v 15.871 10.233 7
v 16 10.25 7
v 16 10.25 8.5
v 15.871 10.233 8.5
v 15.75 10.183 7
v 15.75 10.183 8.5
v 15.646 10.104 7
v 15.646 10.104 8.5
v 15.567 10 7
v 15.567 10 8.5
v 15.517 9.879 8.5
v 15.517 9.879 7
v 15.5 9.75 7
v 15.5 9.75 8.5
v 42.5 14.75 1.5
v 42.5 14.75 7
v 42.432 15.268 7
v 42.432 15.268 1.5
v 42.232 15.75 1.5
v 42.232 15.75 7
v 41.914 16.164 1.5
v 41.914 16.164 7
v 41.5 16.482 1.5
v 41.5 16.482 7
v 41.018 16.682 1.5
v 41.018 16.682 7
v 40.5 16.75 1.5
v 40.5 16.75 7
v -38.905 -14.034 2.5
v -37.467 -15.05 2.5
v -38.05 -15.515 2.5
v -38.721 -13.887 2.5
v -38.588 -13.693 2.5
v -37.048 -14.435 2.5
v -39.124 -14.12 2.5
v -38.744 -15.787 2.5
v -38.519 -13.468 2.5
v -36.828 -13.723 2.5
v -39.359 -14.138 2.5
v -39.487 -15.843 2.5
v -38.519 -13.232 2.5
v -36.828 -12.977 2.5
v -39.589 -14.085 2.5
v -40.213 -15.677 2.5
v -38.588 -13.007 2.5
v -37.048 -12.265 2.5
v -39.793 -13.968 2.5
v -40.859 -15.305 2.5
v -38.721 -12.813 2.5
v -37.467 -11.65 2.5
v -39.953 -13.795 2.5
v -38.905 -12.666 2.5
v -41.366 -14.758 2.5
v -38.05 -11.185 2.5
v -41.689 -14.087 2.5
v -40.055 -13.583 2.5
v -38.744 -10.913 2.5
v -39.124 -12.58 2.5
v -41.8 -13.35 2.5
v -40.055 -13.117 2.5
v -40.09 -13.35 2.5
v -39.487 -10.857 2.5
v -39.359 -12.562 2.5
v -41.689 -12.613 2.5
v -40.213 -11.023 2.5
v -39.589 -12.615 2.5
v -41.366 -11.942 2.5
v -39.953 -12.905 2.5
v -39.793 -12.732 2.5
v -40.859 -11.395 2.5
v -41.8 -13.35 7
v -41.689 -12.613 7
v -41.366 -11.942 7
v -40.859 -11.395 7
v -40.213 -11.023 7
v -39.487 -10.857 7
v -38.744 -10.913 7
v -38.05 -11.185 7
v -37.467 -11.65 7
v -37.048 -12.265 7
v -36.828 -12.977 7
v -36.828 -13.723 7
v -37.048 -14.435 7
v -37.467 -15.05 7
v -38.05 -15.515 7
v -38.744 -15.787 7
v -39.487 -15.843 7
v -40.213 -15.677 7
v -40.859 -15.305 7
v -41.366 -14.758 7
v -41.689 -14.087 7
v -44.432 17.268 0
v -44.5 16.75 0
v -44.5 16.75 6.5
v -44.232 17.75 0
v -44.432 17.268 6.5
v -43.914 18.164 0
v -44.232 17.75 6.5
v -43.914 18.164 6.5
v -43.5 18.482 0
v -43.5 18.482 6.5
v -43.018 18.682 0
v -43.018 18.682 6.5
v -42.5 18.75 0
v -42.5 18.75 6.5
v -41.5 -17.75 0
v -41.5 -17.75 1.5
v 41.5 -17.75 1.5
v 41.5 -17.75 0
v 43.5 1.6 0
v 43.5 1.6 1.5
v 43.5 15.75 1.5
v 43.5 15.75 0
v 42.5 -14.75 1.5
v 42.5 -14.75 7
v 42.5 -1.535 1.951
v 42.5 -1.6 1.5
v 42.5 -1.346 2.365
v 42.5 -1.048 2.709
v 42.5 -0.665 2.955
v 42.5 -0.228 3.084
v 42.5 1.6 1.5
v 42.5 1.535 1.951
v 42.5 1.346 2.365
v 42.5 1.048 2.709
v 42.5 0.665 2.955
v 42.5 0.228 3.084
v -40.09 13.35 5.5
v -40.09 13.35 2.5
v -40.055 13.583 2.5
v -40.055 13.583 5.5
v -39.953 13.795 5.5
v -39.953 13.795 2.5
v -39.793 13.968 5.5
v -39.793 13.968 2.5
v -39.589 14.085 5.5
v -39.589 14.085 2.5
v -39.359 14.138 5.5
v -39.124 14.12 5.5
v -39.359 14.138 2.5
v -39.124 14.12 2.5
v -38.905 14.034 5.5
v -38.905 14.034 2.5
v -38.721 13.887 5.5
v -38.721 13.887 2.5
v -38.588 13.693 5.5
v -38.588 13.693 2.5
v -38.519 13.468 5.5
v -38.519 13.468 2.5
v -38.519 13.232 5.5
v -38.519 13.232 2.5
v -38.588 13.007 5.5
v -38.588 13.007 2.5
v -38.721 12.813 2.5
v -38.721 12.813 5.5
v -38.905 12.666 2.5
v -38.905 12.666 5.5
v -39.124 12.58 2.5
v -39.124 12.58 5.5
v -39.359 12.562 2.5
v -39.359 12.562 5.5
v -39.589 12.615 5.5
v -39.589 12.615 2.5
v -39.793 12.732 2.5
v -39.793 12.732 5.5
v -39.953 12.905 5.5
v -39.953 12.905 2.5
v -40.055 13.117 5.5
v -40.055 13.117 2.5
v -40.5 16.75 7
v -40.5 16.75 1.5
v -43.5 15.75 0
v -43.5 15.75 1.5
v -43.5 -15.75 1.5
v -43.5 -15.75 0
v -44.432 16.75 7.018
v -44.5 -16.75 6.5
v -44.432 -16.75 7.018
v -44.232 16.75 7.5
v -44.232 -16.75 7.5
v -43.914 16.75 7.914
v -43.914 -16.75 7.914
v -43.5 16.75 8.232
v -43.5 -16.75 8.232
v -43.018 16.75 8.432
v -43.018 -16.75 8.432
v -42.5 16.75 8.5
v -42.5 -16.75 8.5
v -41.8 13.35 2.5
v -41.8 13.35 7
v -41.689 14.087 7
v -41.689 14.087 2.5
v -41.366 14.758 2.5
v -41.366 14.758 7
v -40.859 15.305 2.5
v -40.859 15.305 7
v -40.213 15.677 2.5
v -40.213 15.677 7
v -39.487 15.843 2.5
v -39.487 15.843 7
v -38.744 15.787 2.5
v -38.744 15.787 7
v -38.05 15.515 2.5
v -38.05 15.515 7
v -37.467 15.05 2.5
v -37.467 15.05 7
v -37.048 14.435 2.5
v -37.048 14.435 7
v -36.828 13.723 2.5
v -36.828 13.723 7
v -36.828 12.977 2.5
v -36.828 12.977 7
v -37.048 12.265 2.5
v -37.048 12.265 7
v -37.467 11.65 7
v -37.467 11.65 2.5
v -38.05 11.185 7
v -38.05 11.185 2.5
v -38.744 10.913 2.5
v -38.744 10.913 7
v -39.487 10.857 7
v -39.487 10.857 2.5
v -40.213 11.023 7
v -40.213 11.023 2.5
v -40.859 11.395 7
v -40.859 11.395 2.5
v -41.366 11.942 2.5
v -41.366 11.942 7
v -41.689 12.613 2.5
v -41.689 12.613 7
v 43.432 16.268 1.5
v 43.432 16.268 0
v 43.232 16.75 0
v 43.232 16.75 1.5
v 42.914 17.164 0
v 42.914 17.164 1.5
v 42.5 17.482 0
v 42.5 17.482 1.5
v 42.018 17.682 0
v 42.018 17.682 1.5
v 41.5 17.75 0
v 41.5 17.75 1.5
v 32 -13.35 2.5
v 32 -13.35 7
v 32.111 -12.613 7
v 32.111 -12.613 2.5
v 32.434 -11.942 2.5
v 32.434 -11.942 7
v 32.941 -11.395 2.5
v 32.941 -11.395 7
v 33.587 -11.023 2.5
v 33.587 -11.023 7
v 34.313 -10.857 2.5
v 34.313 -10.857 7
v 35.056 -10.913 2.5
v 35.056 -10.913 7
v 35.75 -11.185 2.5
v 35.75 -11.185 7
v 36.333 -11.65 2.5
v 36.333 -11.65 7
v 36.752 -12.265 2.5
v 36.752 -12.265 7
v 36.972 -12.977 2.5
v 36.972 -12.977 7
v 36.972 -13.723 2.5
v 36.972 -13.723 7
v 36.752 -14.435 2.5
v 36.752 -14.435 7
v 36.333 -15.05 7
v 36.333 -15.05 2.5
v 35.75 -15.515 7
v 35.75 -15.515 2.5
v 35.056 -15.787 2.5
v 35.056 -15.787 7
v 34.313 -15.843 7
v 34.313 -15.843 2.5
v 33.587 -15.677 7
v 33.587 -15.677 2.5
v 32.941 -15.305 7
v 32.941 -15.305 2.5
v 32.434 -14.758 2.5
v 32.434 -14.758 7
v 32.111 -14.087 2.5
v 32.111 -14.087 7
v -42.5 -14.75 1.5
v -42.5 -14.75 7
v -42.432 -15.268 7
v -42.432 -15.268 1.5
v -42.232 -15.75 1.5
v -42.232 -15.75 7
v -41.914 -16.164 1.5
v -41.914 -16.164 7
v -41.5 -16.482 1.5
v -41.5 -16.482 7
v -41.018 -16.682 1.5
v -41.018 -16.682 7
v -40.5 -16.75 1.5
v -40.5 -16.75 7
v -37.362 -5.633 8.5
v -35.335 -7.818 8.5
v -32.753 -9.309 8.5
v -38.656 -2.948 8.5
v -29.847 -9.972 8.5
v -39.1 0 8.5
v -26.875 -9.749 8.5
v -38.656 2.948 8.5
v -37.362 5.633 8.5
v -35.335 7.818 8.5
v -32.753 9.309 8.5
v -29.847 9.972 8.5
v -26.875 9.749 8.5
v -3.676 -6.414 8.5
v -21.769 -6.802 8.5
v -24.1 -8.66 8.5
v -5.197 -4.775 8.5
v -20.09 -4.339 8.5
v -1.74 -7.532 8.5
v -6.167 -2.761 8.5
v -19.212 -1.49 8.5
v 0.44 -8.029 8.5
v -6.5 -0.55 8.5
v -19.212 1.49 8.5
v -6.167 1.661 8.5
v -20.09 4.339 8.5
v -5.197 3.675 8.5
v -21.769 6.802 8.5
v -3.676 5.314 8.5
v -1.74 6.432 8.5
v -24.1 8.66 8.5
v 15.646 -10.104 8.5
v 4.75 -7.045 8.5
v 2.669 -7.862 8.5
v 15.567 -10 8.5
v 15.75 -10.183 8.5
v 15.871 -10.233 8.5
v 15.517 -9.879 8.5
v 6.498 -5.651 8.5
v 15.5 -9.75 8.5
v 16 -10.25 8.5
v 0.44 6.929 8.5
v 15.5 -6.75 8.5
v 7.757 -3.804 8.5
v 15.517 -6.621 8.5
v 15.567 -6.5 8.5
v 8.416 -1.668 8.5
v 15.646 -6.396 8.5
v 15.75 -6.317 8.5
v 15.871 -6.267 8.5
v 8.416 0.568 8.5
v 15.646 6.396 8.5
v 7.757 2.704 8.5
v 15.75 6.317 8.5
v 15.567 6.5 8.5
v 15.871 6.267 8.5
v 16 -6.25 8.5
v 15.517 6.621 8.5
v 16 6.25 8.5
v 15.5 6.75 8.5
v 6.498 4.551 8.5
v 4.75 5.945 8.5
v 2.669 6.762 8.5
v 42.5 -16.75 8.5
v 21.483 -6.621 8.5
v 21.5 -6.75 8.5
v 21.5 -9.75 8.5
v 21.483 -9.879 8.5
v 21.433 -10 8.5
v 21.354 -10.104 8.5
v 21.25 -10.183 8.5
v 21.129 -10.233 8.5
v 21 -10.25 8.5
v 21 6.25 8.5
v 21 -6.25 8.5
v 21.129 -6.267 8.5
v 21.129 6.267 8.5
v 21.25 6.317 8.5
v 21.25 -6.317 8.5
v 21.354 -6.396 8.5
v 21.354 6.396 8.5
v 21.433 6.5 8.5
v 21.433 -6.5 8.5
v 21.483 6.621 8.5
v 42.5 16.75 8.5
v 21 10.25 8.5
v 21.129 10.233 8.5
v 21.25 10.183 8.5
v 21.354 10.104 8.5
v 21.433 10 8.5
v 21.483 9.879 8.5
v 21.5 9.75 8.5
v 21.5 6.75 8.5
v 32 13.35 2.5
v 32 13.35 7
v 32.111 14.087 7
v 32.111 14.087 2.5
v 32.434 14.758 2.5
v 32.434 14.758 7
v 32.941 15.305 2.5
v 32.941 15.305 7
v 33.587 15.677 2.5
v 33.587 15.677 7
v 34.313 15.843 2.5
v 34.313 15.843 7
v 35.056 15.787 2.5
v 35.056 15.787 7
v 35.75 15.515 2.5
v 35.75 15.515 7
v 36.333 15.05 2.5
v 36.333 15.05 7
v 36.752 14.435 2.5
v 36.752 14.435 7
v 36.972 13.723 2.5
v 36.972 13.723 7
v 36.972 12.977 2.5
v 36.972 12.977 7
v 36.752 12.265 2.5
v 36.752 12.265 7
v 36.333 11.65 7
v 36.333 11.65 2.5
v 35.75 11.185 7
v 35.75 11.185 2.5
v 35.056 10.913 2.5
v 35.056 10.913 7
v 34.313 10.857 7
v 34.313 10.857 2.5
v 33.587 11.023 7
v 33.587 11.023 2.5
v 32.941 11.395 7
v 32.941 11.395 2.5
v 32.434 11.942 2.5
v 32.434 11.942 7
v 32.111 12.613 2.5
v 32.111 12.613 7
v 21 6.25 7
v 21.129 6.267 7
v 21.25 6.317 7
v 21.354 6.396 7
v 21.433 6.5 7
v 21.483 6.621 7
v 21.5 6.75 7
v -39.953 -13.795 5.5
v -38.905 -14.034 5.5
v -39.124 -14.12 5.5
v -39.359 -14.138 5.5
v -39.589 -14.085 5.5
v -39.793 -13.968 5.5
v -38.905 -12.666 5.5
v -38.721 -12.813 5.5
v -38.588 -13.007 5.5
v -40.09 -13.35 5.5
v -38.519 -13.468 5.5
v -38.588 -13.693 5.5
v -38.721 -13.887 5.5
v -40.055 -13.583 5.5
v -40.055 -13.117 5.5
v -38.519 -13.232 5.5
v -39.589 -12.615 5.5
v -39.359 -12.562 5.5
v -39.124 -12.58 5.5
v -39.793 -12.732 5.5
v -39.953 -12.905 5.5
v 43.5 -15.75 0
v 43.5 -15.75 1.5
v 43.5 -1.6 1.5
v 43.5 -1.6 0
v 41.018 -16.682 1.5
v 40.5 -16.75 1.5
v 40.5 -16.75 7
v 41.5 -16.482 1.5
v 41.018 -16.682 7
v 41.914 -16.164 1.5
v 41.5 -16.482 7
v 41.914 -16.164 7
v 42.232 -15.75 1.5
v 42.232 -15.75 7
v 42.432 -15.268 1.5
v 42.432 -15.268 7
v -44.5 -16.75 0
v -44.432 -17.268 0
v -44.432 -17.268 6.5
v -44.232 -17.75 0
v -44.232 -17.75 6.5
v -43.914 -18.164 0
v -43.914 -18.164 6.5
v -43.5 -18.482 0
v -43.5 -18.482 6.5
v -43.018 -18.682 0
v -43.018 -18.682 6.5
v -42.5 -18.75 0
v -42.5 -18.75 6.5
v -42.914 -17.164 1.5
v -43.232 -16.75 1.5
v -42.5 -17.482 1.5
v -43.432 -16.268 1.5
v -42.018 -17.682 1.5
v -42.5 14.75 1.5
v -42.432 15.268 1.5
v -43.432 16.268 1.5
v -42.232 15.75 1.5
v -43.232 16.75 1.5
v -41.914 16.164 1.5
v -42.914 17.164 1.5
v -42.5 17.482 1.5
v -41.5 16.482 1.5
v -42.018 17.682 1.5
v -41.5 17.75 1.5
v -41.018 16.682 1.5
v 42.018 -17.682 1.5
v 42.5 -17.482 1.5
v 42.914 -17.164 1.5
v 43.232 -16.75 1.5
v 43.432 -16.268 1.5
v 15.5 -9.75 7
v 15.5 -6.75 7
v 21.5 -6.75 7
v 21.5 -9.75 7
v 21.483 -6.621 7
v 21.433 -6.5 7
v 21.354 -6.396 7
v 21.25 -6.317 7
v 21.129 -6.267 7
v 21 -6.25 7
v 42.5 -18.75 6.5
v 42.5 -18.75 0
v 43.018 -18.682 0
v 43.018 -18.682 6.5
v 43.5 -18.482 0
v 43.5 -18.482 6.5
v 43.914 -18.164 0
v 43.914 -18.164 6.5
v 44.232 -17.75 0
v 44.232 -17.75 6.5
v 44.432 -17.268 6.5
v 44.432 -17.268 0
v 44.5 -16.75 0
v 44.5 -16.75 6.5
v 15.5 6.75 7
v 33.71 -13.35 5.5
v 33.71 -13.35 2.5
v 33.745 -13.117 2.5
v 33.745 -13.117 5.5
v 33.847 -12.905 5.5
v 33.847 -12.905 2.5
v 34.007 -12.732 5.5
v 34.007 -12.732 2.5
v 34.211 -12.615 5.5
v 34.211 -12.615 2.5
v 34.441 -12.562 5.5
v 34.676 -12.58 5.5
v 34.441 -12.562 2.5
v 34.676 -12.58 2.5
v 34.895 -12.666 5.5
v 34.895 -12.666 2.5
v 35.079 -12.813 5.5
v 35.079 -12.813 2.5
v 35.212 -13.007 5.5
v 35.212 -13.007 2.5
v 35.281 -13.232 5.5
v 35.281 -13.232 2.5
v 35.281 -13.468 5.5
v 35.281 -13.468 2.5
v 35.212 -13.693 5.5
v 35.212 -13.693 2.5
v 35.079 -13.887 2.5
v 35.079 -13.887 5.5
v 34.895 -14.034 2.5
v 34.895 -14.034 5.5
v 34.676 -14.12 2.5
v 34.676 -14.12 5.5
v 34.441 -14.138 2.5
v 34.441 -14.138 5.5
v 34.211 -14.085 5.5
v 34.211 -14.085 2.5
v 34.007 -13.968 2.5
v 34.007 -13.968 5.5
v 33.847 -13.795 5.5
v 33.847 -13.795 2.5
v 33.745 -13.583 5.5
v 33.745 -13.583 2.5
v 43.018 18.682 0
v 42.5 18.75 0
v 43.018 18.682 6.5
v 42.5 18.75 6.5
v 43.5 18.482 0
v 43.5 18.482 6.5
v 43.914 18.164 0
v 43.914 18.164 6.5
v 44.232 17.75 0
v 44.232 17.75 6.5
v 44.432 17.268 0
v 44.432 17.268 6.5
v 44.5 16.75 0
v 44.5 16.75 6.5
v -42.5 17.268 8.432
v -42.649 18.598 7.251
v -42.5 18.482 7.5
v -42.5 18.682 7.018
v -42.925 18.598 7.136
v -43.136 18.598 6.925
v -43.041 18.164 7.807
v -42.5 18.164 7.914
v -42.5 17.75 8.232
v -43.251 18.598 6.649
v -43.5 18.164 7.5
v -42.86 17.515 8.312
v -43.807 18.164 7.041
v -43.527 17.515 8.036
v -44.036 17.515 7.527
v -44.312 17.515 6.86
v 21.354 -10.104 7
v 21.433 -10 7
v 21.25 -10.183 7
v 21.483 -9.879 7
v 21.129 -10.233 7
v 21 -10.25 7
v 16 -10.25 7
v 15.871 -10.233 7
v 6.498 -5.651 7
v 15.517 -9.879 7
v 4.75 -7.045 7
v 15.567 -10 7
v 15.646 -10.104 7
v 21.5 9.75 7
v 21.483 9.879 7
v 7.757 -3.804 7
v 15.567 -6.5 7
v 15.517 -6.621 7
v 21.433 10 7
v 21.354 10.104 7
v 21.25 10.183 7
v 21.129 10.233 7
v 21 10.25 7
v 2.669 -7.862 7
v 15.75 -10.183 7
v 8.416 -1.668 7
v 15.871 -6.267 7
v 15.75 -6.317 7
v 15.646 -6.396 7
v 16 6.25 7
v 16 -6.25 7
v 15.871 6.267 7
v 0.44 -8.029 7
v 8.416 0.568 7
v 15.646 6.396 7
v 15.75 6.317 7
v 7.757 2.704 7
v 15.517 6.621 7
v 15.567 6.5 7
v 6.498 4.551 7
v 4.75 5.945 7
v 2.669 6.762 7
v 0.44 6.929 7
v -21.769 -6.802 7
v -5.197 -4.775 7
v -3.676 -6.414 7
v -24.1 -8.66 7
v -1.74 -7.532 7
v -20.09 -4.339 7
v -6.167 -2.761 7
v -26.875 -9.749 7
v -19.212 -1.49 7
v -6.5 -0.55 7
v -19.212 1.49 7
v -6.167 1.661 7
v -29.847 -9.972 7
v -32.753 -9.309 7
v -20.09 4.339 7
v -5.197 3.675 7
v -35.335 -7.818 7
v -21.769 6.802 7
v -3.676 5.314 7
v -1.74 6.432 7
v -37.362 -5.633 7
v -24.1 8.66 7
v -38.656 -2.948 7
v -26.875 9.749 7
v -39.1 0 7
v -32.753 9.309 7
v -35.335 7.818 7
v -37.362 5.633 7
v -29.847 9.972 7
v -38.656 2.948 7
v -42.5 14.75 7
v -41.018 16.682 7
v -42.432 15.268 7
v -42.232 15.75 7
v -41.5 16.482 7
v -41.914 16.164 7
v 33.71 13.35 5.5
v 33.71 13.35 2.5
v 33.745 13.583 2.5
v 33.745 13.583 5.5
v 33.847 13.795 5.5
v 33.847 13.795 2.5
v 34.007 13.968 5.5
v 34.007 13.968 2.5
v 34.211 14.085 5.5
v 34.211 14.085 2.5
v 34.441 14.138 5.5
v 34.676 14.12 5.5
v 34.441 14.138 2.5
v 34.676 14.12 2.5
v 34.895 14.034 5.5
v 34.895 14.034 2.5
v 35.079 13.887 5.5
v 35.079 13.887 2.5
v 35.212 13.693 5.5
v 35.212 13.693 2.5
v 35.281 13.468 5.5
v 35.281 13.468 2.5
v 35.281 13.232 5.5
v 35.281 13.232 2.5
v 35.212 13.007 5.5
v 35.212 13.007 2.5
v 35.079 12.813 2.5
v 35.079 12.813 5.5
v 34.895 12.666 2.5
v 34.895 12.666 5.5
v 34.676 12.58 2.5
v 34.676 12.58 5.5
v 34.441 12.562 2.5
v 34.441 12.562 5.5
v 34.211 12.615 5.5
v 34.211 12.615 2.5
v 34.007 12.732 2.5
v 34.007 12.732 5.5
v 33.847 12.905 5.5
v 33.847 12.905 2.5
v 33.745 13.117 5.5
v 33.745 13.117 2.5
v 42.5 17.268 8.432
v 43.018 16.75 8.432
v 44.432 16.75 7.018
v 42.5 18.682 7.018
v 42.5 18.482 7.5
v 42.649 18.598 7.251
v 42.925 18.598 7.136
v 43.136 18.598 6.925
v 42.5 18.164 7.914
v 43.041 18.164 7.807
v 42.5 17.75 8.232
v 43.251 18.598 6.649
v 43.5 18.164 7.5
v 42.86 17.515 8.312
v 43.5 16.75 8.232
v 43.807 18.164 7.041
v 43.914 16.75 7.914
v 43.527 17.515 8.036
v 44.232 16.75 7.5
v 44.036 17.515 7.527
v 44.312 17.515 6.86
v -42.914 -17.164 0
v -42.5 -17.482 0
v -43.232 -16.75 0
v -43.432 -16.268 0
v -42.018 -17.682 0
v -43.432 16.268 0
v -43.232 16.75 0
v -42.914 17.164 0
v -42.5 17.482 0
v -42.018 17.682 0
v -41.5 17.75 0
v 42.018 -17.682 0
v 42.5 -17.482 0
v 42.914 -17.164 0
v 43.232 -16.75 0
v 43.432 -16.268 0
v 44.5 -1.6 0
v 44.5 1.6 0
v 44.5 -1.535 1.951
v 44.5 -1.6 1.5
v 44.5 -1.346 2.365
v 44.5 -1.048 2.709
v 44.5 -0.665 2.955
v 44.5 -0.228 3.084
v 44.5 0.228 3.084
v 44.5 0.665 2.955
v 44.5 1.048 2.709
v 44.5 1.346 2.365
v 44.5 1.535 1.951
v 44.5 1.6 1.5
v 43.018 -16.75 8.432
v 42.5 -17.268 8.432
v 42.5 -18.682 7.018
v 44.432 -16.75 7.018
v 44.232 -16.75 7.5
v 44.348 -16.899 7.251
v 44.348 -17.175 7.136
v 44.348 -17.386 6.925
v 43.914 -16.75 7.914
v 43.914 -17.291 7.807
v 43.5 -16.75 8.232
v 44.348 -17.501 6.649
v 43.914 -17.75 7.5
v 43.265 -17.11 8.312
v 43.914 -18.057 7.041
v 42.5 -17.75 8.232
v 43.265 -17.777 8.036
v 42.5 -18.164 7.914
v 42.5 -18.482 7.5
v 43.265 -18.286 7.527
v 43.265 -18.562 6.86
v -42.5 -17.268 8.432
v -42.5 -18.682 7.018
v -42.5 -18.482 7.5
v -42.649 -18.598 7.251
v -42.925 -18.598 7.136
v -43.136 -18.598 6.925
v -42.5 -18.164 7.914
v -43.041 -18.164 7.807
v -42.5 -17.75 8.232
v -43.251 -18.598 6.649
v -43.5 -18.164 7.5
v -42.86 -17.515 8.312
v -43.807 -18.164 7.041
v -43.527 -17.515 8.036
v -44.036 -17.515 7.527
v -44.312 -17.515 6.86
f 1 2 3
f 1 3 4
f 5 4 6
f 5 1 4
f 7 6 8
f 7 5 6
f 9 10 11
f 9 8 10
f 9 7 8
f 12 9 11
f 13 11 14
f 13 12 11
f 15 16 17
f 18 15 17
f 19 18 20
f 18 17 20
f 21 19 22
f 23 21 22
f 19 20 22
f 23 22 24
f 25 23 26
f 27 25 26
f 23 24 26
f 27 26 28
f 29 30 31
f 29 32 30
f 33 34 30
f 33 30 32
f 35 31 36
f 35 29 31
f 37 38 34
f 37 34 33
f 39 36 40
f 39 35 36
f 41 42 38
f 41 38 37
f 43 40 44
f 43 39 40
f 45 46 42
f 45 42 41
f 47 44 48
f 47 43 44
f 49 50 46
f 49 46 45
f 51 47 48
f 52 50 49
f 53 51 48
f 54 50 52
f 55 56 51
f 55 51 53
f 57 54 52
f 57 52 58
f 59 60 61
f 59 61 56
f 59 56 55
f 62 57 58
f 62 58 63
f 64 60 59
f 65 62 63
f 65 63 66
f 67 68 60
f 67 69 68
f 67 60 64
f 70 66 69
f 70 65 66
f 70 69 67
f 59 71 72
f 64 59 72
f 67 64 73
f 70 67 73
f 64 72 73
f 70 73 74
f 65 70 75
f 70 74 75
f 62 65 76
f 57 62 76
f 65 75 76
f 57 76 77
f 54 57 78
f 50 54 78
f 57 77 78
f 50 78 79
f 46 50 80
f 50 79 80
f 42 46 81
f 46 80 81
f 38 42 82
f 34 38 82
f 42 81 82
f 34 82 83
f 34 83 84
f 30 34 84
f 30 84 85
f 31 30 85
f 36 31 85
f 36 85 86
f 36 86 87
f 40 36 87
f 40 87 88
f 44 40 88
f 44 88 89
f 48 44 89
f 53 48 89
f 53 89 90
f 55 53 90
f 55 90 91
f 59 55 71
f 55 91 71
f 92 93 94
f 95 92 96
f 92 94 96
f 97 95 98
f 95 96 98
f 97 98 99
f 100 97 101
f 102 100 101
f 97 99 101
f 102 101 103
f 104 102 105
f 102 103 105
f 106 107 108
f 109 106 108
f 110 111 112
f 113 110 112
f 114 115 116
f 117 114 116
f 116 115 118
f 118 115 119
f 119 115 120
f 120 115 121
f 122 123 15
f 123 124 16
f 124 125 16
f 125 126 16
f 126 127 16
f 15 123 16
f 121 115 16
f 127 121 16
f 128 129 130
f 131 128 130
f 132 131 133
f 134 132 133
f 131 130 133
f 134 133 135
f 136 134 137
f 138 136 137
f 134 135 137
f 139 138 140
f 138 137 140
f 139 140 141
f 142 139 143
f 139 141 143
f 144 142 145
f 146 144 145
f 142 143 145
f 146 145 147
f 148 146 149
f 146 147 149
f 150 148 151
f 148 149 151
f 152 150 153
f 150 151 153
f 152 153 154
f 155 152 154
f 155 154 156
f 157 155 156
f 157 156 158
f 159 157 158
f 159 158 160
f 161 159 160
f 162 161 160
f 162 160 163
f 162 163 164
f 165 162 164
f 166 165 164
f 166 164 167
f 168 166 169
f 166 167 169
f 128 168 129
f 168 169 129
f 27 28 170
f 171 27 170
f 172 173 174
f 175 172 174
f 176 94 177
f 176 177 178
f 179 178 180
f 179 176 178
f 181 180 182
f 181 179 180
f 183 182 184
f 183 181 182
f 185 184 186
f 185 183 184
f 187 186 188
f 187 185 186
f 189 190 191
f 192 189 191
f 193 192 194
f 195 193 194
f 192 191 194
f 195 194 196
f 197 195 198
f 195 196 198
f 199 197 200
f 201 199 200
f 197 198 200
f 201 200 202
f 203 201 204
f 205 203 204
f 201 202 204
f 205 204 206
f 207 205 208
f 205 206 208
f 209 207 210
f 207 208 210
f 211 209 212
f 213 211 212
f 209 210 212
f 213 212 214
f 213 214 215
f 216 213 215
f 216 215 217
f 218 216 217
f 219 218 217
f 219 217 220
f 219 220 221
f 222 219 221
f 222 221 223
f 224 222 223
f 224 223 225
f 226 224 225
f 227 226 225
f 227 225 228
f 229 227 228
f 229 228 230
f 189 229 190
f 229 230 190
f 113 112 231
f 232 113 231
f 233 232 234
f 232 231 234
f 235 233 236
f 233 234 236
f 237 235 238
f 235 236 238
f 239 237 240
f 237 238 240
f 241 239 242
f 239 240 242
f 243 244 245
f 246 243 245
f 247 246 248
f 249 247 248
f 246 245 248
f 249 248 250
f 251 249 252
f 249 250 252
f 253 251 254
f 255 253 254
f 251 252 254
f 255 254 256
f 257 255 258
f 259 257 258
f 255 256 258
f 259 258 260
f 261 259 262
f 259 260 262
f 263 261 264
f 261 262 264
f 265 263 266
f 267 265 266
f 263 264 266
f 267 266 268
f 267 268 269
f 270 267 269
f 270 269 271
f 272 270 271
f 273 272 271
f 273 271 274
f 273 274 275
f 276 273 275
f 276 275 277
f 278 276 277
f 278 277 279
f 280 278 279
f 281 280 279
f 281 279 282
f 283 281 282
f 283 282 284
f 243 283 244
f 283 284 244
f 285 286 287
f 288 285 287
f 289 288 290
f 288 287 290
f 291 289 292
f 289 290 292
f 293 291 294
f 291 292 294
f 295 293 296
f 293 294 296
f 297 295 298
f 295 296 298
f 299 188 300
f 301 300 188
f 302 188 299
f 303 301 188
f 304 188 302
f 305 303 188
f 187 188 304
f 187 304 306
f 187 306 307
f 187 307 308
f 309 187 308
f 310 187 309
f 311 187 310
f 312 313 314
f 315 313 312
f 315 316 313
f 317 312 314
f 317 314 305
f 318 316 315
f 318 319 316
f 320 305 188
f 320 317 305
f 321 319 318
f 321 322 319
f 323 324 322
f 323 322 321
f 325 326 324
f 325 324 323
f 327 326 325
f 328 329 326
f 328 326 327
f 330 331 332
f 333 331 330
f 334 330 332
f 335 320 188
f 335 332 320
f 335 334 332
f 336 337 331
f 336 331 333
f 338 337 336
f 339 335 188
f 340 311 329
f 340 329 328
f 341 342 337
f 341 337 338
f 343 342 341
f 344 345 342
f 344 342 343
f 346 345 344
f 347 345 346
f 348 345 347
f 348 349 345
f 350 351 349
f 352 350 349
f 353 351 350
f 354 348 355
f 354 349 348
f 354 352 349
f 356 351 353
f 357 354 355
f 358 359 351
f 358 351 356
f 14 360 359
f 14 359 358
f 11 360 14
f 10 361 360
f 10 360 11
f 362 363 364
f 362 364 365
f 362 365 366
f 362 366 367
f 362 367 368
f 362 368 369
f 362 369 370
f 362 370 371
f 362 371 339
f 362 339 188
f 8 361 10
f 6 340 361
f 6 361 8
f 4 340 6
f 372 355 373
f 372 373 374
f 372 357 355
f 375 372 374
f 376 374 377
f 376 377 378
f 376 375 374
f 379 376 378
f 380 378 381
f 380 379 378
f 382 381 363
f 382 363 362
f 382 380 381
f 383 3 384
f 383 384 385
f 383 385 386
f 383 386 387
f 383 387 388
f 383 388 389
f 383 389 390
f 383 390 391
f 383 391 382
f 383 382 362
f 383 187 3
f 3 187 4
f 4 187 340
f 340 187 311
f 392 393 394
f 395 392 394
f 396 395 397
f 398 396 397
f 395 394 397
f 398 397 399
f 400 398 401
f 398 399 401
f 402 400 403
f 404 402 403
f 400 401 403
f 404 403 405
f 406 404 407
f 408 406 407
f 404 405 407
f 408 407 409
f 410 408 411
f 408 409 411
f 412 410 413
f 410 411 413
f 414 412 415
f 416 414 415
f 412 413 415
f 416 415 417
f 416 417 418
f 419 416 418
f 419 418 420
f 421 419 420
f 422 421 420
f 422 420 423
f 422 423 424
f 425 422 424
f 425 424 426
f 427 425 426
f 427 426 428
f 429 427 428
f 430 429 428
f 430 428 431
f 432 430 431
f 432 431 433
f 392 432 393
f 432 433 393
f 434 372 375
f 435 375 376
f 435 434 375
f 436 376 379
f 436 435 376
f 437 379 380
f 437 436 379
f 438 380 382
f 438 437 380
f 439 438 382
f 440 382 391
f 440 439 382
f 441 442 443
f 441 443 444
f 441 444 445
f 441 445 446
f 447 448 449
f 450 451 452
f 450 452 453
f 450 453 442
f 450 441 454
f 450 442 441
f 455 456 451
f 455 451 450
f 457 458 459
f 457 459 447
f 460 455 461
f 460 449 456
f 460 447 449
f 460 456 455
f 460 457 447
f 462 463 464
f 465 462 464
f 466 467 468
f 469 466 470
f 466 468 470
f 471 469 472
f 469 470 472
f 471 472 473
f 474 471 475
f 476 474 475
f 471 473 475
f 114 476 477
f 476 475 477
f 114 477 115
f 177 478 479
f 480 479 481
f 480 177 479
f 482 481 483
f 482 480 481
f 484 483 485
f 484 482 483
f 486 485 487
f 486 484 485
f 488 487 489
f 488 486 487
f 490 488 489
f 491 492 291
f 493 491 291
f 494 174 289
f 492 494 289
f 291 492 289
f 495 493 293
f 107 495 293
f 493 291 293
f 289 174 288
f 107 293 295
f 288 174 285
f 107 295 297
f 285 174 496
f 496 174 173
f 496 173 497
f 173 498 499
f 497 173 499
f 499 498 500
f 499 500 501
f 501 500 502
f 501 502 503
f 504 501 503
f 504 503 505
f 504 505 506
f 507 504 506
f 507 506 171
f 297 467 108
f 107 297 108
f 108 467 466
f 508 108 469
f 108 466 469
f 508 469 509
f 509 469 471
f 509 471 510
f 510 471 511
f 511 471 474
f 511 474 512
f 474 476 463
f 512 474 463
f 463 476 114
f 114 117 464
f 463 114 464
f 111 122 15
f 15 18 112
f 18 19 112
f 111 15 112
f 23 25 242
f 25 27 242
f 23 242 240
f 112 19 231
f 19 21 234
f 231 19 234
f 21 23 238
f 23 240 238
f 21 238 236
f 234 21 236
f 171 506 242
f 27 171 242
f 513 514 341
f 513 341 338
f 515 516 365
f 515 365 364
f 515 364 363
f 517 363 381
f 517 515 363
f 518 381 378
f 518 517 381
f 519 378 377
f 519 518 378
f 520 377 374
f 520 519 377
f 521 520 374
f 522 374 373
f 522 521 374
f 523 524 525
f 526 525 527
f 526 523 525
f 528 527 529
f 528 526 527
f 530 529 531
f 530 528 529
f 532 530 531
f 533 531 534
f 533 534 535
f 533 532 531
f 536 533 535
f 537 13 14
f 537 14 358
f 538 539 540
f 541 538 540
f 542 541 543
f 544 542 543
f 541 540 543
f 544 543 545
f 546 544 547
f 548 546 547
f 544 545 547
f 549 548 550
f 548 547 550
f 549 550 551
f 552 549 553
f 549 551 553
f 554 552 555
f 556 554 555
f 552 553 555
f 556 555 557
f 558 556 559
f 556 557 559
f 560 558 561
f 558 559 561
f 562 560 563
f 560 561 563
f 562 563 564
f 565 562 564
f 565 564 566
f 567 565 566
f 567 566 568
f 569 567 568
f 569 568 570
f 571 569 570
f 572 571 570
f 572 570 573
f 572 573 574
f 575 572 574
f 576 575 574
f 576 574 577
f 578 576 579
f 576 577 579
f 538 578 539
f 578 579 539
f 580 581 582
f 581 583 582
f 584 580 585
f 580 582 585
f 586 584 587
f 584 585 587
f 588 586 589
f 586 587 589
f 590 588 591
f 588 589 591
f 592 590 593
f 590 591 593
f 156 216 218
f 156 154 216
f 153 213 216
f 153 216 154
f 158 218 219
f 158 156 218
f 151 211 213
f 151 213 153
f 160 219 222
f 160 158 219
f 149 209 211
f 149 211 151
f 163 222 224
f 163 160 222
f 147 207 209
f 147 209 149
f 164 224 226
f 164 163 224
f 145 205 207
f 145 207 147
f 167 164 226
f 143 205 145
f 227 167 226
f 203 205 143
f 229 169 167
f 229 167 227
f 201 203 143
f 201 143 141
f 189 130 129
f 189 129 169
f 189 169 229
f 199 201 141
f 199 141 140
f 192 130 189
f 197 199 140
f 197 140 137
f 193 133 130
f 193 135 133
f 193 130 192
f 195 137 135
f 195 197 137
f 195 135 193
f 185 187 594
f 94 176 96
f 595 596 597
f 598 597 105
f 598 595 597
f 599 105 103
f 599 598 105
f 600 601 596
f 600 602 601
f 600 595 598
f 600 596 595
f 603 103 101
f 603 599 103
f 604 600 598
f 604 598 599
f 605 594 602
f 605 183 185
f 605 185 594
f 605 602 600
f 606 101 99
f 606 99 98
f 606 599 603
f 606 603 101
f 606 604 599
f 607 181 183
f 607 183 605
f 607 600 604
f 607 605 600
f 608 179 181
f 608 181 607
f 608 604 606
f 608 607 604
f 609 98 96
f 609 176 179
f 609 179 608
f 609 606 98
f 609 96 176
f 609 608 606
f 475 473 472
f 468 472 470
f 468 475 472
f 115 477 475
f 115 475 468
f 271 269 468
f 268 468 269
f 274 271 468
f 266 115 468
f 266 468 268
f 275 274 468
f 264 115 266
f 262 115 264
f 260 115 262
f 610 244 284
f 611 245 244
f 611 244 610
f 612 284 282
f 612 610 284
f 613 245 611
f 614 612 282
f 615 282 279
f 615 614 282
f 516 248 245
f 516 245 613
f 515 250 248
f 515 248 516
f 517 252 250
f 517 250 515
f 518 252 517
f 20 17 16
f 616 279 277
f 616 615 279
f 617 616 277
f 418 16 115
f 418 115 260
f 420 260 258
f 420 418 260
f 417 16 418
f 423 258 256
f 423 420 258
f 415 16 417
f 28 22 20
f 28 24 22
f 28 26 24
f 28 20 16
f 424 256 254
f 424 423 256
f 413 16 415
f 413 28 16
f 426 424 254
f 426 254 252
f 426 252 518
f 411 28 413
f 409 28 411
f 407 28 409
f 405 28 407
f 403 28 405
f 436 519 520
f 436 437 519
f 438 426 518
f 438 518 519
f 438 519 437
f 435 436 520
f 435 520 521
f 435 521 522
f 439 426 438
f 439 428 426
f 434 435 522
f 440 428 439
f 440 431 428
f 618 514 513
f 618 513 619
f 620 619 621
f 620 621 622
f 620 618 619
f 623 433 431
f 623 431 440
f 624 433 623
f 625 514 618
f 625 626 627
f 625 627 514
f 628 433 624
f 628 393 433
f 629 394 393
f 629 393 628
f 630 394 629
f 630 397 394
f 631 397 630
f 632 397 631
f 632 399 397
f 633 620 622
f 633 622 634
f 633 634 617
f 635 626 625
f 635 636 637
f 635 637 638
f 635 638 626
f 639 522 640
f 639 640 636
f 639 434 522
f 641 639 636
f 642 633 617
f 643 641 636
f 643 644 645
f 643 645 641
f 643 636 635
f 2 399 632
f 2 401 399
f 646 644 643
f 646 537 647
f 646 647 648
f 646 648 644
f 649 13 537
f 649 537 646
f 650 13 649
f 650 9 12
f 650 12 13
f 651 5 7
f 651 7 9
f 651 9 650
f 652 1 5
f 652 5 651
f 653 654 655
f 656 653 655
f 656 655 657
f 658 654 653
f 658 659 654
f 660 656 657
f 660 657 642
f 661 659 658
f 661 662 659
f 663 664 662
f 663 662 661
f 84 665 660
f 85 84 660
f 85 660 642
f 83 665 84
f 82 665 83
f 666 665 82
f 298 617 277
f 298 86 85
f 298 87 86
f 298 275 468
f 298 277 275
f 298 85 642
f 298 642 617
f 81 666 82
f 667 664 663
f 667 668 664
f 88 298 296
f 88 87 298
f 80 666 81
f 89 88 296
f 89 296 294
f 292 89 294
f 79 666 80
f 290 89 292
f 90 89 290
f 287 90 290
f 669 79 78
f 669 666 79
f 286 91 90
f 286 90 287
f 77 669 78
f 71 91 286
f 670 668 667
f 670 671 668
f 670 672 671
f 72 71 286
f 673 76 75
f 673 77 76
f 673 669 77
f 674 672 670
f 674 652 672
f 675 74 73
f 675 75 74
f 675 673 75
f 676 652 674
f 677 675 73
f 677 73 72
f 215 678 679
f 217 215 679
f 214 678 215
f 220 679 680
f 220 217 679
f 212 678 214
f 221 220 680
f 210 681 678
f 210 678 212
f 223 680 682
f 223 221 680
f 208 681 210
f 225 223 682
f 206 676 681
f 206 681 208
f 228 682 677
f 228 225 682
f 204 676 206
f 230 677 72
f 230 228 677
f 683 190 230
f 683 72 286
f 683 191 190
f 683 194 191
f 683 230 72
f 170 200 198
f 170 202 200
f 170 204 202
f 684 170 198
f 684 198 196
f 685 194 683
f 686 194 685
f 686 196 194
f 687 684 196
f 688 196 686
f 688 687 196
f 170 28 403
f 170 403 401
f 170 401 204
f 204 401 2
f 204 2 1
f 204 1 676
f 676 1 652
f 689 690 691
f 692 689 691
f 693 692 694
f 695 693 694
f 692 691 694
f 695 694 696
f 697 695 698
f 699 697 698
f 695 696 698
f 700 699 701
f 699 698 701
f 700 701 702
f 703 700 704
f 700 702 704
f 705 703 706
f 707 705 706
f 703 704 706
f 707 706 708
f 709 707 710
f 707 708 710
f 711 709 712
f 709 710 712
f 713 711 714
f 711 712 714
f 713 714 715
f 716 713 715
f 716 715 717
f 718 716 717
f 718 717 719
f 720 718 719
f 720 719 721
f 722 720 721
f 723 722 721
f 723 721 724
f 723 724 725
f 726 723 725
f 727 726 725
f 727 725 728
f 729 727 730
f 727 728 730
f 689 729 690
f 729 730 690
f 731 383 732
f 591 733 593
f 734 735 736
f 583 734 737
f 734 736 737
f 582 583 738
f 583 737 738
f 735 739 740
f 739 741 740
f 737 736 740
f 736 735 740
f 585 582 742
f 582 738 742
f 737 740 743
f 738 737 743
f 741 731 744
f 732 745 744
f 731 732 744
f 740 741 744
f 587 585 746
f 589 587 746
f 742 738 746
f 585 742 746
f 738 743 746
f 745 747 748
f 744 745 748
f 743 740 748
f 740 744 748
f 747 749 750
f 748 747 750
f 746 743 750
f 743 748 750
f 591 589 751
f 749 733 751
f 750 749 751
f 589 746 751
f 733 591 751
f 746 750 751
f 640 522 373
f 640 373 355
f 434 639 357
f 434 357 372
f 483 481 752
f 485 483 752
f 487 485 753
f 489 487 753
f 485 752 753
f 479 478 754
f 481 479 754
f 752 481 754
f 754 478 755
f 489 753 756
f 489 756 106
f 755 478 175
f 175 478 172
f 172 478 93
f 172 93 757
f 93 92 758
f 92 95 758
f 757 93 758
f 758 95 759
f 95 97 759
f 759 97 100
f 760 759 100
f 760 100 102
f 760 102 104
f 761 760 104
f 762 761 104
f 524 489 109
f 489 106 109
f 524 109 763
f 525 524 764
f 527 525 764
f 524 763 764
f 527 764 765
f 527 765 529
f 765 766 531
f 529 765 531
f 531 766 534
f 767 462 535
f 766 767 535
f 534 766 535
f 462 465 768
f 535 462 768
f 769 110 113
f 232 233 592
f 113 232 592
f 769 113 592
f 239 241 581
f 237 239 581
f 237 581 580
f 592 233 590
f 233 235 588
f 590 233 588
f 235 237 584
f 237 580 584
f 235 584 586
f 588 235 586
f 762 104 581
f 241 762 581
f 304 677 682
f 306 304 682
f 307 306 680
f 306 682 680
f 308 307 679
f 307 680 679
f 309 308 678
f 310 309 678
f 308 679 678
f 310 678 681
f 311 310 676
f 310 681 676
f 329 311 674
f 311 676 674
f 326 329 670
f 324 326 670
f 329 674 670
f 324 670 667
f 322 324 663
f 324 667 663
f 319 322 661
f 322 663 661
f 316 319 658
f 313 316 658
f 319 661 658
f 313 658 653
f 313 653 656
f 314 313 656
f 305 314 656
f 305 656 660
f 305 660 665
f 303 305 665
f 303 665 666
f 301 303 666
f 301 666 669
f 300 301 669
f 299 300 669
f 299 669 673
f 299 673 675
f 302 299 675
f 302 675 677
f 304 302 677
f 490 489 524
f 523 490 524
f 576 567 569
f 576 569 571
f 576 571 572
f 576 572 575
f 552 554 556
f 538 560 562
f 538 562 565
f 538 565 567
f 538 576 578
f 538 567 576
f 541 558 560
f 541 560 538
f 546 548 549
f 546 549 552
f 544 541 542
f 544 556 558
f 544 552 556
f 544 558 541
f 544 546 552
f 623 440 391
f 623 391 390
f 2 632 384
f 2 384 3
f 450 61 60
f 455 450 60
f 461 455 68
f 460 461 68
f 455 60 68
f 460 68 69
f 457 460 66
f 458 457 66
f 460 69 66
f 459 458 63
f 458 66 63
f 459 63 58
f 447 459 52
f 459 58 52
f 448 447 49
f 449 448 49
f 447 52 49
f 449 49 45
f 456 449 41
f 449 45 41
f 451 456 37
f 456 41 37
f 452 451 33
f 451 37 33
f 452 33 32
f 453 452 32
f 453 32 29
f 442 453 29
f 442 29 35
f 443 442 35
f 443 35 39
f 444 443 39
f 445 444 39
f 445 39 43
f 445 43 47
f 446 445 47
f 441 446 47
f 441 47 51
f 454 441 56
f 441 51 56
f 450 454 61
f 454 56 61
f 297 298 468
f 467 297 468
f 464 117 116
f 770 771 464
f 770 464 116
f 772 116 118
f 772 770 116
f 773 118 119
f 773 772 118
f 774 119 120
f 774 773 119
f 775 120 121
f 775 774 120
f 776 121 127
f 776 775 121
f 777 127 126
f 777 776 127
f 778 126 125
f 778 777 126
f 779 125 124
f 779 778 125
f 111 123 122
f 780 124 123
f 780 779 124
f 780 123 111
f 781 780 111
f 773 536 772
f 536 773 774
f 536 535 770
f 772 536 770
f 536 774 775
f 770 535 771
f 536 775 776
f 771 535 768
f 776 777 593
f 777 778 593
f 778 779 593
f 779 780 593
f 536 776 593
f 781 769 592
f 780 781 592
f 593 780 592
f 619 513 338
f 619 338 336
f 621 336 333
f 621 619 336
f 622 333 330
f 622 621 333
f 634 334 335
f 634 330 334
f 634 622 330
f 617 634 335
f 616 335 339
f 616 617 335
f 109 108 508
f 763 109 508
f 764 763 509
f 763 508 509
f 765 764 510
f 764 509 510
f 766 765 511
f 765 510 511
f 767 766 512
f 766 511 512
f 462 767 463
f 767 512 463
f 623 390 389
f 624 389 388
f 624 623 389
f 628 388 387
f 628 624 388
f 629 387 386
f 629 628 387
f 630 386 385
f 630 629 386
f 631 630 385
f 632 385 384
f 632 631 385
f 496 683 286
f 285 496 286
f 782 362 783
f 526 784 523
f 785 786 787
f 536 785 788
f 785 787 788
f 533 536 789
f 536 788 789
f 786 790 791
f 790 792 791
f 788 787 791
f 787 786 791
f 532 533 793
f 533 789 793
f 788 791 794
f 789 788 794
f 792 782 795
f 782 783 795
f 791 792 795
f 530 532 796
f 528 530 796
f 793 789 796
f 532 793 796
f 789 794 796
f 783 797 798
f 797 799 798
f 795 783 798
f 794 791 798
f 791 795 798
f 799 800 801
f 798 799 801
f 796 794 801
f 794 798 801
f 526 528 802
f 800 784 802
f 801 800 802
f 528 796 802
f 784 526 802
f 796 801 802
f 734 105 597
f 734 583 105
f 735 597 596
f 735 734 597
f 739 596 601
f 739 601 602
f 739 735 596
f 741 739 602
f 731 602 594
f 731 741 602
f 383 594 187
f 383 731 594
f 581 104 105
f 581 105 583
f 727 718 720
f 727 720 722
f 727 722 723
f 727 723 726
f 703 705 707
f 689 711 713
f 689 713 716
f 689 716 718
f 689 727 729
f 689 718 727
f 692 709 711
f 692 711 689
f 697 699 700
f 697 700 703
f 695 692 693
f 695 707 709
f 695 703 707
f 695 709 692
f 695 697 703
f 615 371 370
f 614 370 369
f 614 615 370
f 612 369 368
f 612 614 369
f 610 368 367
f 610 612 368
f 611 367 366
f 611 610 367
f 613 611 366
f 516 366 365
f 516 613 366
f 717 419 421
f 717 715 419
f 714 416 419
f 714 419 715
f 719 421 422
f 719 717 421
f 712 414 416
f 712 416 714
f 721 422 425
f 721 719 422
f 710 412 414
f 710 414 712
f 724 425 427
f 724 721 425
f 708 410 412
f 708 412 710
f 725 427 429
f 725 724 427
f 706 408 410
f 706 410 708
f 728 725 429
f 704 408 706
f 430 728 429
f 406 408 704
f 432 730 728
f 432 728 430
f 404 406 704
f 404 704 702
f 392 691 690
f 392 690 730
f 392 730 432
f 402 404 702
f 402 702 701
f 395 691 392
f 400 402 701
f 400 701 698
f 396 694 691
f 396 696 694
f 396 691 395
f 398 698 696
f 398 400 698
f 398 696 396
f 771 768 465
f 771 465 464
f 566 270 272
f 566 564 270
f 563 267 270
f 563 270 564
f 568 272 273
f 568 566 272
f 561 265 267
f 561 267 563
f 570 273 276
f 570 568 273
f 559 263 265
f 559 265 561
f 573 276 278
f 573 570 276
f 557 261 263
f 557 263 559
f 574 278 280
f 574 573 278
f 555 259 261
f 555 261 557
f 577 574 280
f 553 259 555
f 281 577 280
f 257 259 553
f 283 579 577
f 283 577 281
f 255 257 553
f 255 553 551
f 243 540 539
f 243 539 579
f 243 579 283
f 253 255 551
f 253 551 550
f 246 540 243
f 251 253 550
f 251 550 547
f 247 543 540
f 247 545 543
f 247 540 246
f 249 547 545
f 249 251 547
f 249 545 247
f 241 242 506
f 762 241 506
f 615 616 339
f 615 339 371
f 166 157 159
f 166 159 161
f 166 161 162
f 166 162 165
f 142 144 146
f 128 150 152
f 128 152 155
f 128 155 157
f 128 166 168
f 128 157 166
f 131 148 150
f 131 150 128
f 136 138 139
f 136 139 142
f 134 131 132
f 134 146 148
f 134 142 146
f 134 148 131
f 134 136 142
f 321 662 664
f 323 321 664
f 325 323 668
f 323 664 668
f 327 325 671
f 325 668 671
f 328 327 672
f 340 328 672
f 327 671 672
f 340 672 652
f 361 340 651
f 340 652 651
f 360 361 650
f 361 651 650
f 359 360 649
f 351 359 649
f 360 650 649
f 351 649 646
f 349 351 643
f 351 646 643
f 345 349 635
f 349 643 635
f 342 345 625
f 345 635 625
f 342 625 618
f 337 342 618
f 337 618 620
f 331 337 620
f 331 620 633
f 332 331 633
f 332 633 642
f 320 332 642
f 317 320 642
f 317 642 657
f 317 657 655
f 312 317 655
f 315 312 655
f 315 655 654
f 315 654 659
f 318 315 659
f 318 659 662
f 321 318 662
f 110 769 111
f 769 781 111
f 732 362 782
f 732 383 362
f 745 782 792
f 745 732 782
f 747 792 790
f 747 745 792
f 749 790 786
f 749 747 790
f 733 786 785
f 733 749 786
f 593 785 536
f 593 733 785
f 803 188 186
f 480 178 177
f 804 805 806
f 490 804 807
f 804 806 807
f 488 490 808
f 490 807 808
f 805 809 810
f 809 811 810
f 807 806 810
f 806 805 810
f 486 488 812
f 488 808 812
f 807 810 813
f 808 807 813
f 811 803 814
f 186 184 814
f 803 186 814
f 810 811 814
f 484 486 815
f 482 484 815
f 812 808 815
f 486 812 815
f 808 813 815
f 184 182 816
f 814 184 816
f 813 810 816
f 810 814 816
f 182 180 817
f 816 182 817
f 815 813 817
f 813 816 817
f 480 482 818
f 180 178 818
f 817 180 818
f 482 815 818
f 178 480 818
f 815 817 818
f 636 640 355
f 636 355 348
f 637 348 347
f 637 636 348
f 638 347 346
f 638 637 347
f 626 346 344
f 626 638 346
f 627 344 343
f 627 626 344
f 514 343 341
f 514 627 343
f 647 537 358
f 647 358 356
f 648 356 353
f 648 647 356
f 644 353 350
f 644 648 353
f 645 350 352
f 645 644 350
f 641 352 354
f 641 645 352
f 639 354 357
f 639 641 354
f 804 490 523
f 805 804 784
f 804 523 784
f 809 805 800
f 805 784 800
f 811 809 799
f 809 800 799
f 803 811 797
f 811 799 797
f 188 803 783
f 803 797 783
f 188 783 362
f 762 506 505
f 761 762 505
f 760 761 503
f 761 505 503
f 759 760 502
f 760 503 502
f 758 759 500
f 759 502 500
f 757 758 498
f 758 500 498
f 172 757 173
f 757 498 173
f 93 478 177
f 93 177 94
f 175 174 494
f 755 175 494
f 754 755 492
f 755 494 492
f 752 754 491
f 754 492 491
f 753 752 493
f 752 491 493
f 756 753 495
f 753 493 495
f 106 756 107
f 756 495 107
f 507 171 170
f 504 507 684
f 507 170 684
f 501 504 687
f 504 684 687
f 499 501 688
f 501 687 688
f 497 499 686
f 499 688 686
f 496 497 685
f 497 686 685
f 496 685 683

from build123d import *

# Parameters (mm, degrees)
SKETCH_1_W           = 89
SKETCH_1_H           = 37.5
EXTRUDE_1_DEPTH      = 8.5
SKETCH_2_W           = 85
SKETCH_2_H           = 33.5
CUT_EXTRUDE_1_DEPTH  = 7
CUT_EXTRUDE_3_DEPTH  = 4
FILLET_1_R           = 2
EXTRUDE_2_DEPTH      = 1
SKETCH_10_R          = 2.5
EXTRUDE_3_DEPTH      = 4.5
SKETCH_11_R          = 0.79
CUT_EXTRUDE_9_DEPTH  = 3
SKETCH_8_R           = 7.5
CUT_EXTRUDE_8_DEPTH  = 3
SKETCH_7_R           = 10
CUT_EXTRUDE_7_DEPTH  = 3
CUT_EXTRUDE_START    = -2.5
CUT_EXTRUDE_10_DEPTH = 2.5
CUT_EXTRUDE_11_DEPTH = 10


with BuildPart() as part:
    # 草图1 → 凸台-拉伸1 (new body)
    with BuildSketch(Plane.XY):
        Rectangle(SKETCH_1_W, SKETCH_1_H)
    extrude(amount=EXTRUDE_1_DEPTH)

    # 草图2 → 切除-拉伸1 (cut)
    with BuildSketch(Plane(origin=(0, 0, 0), x_dir=(-1, 0, 0), z_dir=(0, 0, -1))):
        Rectangle(SKETCH_2_W, SKETCH_2_H)
    extrude(amount=-CUT_EXTRUDE_1_DEPTH, mode=Mode.SUBTRACT)

    # 草图3 → 切除-拉伸3 (cut)
    with BuildSketch(Plane(origin=(44.5, 0, 0), x_dir=(0, 0, -1), z_dir=(1, 0, 0))):
        with BuildLine():
            Line((0, 1.6), (0, -1.6))
            Line((0, -1.6), (-1.5, -1.6))
            ThreePointArc((-1.5, -1.6), (-3.1, 0), (-1.5, 1.6))
            Line((-1.5, 1.6), (0, 1.6))
        make_face()
    extrude(amount=-CUT_EXTRUDE_3_DEPTH, mode=Mode.SUBTRACT)

    # 圆角1
    fillet_1_edges = [part.edges().sort_by_distance(p)[0] for p in [
        (-44.5, 0, 8.5),
        (0, -18.75, 8.5),
        (42.5, -16.75, 3.5),
        (42.5, 16.75, 3.5),
        (-42.5, 16.75, 3.5),
        (-42.5, -16.75, 3.5),
        (44.5, 0, 8.5),
        (0, 18.75, 8.5),
        (44.5, -18.75, 4.25),
        (-44.5, -18.75, 4.25),
        (-44.5, 18.75, 4.25),
        (44.5, 18.75, 4.25),
    ]]
    fillet(fillet_1_edges, radius=FILLET_1_R)

    # 草图9 → 凸台-拉伸2 (add)
    with BuildSketch(Plane(origin=(0, 0, 0), x_dir=(-1, 0, 0), z_dir=(0, 0, -1))):
        with BuildLine():
            Line((-43.5, 15.75), (-43.5, 1.6))
            Line((-43.5, 1.6), (-42.5, 1.6))
            Line((-42.5, 1.6), (-42.5, 14.75))
            ThreePointArc((-42.5, 14.75), (-41.914213562, 16.164213562), (-40.5, 16.75))
            Line((-40.5, 16.75), (40.5, 16.75))
            ThreePointArc((40.5, 16.75), (41.914213562, 16.164213562), (42.5, 14.75))
            Line((42.5, 14.75), (42.5, -14.75))
            ThreePointArc((42.5, -14.75), (41.914213562, -16.164213562), (40.5, -16.75))
            Line((40.5, -16.75), (-40.5, -16.75))
            ThreePointArc((-40.5, -16.75), (-41.914213562, -16.164213562), (-42.5, -14.75))
            Line((-42.5, -14.75), (-42.5, -1.6))
            Line((-42.5, -1.6), (-43.5, -1.6))
            Line((-43.5, -1.6), (-43.5, -15.75))
            ThreePointArc((-43.5, -15.75), (-42.914213562, -17.164213562), (-41.5, -17.75))
            Line((-41.5, -17.75), (41.5, -17.75))
            ThreePointArc((41.5, -17.75), (42.914213562, -17.164213562), (43.5, -15.75))
            Line((43.5, -15.75), (43.5, 15.75))
            ThreePointArc((43.5, 15.75), (42.914213562, 17.164213562), (41.5, 17.75))
            Line((41.5, 17.75), (-41.5, 17.75))
            ThreePointArc((-41.5, 17.75), (-42.914213562, 17.164213562), (-43.5, 15.75))
        make_face()
    extrude(amount=EXTRUDE_2_DEPTH)

    # 草图10 → 凸台-拉伸3 (add)
    with BuildSketch(Plane(origin=(0, 0, 7), x_dir=(-1, 0, 0), z_dir=(0, 0, -1))):
        with Locations((39.3, -13.35)):
            Circle(SKETCH_10_R)
        with Locations((39.3, 13.35)):
            Circle(SKETCH_10_R)
        with Locations((-34.5, 13.35)):
            Circle(SKETCH_10_R)
        with Locations((-34.5, -13.35)):
            Circle(SKETCH_10_R)
    extrude(amount=EXTRUDE_3_DEPTH)

    # 草图11 → 切除-拉伸9 (cut)
    with BuildSketch(Plane(origin=(0, 0, 2.5), x_dir=(-1, 0, 0), z_dir=(0, 0, -1))):
        with Locations((-34.5, 13.35)):
            Circle(SKETCH_11_R)
        with Locations((-34.5, -13.35)):
            Circle(SKETCH_11_R)
        with Locations((39.3, 13.35)):
            Circle(SKETCH_11_R)
        with Locations((39.3, -13.35)):
            Circle(SKETCH_11_R)
    extrude(amount=-CUT_EXTRUDE_9_DEPTH, mode=Mode.SUBTRACT)

    # 草图8 → 切除-拉伸8 (cut)
    with BuildSketch(Plane(origin=(0, 0, 7), x_dir=(-1, 0, 0), z_dir=(0, 0, -1))):
        with Locations((-1, -0.55)):
            Circle(SKETCH_8_R)
    extrude(amount=-CUT_EXTRUDE_8_DEPTH, mode=Mode.SUBTRACT)

    # 草图7 → 切除-拉伸7 (cut)
    with BuildSketch(Plane(origin=(0, 0, 7), x_dir=(-1, 0, 0), z_dir=(0, 0, -1))):
        with Locations((29.1, 0)):
            Circle(SKETCH_7_R)
    extrude(amount=-CUT_EXTRUDE_7_DEPTH, mode=Mode.SUBTRACT)

    # 草图13 → 切除-拉伸10 (cut)
    with BuildSketch(Plane(origin=(0, 0, -1), x_dir=(-1, 0, 0), z_dir=(0, 0, -1)).offset(CUT_EXTRUDE_START)):
        with BuildLine():
            Line((-41.5, 17.75), (41.5, 17.75))
            ThreePointArc((41.5, 17.75), (42.914213562, 17.164213562), (43.5, 15.75))
            Line((43.5, 15.75), (43.5, -15.75))
            ThreePointArc((43.5, -15.75), (42.914213562, -17.164213562), (41.5, -17.75))
            Line((41.5, -17.75), (-41.5, -17.75))
            ThreePointArc((-41.5, -17.75), (-42.914213562, -17.164213562), (-43.5, -15.75))
            Line((-43.5, -15.75), (-43.5, 15.75))
            ThreePointArc((-43.5, 15.75), (-42.914213562, 17.164213562), (-41.5, 17.75))
        make_face()
    extrude(amount=CUT_EXTRUDE_10_DEPTH, mode=Mode.SUBTRACT)

    # 草图14 → 切除-拉伸11 (cut)
    with BuildSketch(Plane(origin=(0, 0, 7), x_dir=(-1, 0, 0), z_dir=(0, 0, -1))):
        with BuildLine():
            Line((-21, -6.25), (-16, -6.25))
            ThreePointArc((-16, -6.25), (-15.646446609, -6.396446609), (-15.5, -6.75))
            Line((-15.5, -6.75), (-15.5, -9.75))
            ThreePointArc((-15.5, -9.75), (-15.646446609, -10.103553391), (-16, -10.25))
            Line((-16, -10.25), (-21, -10.25))
            ThreePointArc((-21, -10.25), (-21.353553391, -10.103553391), (-21.5, -9.75))
            Line((-21.5, -9.75), (-21.5, -6.75))
            ThreePointArc((-21.5, -6.75), (-21.353553391, -6.396446609), (-21, -6.25))
        make_face()
        with BuildLine():
            Line((-21, 10.25), (-16, 10.25))
            ThreePointArc((-16, 10.25), (-15.646446609, 10.103553391), (-15.5, 9.75))
            Line((-15.5, 9.75), (-15.5, 6.75))
            ThreePointArc((-15.5, 6.75), (-15.646446609, 6.396446609), (-16, 6.25))
            Line((-16, 6.25), (-21, 6.25))
            ThreePointArc((-21, 6.25), (-21.353553391, 6.396446609), (-21.5, 6.75))
            Line((-21.5, 6.75), (-21.5, 9.75))
            ThreePointArc((-21.5, 9.75), (-21.353553391, 10.103553391), (-21, 10.25))
        make_face()
    extrude(amount=-CUT_EXTRUDE_11_DEPTH, mode=Mode.SUBTRACT)


solid = part.part
